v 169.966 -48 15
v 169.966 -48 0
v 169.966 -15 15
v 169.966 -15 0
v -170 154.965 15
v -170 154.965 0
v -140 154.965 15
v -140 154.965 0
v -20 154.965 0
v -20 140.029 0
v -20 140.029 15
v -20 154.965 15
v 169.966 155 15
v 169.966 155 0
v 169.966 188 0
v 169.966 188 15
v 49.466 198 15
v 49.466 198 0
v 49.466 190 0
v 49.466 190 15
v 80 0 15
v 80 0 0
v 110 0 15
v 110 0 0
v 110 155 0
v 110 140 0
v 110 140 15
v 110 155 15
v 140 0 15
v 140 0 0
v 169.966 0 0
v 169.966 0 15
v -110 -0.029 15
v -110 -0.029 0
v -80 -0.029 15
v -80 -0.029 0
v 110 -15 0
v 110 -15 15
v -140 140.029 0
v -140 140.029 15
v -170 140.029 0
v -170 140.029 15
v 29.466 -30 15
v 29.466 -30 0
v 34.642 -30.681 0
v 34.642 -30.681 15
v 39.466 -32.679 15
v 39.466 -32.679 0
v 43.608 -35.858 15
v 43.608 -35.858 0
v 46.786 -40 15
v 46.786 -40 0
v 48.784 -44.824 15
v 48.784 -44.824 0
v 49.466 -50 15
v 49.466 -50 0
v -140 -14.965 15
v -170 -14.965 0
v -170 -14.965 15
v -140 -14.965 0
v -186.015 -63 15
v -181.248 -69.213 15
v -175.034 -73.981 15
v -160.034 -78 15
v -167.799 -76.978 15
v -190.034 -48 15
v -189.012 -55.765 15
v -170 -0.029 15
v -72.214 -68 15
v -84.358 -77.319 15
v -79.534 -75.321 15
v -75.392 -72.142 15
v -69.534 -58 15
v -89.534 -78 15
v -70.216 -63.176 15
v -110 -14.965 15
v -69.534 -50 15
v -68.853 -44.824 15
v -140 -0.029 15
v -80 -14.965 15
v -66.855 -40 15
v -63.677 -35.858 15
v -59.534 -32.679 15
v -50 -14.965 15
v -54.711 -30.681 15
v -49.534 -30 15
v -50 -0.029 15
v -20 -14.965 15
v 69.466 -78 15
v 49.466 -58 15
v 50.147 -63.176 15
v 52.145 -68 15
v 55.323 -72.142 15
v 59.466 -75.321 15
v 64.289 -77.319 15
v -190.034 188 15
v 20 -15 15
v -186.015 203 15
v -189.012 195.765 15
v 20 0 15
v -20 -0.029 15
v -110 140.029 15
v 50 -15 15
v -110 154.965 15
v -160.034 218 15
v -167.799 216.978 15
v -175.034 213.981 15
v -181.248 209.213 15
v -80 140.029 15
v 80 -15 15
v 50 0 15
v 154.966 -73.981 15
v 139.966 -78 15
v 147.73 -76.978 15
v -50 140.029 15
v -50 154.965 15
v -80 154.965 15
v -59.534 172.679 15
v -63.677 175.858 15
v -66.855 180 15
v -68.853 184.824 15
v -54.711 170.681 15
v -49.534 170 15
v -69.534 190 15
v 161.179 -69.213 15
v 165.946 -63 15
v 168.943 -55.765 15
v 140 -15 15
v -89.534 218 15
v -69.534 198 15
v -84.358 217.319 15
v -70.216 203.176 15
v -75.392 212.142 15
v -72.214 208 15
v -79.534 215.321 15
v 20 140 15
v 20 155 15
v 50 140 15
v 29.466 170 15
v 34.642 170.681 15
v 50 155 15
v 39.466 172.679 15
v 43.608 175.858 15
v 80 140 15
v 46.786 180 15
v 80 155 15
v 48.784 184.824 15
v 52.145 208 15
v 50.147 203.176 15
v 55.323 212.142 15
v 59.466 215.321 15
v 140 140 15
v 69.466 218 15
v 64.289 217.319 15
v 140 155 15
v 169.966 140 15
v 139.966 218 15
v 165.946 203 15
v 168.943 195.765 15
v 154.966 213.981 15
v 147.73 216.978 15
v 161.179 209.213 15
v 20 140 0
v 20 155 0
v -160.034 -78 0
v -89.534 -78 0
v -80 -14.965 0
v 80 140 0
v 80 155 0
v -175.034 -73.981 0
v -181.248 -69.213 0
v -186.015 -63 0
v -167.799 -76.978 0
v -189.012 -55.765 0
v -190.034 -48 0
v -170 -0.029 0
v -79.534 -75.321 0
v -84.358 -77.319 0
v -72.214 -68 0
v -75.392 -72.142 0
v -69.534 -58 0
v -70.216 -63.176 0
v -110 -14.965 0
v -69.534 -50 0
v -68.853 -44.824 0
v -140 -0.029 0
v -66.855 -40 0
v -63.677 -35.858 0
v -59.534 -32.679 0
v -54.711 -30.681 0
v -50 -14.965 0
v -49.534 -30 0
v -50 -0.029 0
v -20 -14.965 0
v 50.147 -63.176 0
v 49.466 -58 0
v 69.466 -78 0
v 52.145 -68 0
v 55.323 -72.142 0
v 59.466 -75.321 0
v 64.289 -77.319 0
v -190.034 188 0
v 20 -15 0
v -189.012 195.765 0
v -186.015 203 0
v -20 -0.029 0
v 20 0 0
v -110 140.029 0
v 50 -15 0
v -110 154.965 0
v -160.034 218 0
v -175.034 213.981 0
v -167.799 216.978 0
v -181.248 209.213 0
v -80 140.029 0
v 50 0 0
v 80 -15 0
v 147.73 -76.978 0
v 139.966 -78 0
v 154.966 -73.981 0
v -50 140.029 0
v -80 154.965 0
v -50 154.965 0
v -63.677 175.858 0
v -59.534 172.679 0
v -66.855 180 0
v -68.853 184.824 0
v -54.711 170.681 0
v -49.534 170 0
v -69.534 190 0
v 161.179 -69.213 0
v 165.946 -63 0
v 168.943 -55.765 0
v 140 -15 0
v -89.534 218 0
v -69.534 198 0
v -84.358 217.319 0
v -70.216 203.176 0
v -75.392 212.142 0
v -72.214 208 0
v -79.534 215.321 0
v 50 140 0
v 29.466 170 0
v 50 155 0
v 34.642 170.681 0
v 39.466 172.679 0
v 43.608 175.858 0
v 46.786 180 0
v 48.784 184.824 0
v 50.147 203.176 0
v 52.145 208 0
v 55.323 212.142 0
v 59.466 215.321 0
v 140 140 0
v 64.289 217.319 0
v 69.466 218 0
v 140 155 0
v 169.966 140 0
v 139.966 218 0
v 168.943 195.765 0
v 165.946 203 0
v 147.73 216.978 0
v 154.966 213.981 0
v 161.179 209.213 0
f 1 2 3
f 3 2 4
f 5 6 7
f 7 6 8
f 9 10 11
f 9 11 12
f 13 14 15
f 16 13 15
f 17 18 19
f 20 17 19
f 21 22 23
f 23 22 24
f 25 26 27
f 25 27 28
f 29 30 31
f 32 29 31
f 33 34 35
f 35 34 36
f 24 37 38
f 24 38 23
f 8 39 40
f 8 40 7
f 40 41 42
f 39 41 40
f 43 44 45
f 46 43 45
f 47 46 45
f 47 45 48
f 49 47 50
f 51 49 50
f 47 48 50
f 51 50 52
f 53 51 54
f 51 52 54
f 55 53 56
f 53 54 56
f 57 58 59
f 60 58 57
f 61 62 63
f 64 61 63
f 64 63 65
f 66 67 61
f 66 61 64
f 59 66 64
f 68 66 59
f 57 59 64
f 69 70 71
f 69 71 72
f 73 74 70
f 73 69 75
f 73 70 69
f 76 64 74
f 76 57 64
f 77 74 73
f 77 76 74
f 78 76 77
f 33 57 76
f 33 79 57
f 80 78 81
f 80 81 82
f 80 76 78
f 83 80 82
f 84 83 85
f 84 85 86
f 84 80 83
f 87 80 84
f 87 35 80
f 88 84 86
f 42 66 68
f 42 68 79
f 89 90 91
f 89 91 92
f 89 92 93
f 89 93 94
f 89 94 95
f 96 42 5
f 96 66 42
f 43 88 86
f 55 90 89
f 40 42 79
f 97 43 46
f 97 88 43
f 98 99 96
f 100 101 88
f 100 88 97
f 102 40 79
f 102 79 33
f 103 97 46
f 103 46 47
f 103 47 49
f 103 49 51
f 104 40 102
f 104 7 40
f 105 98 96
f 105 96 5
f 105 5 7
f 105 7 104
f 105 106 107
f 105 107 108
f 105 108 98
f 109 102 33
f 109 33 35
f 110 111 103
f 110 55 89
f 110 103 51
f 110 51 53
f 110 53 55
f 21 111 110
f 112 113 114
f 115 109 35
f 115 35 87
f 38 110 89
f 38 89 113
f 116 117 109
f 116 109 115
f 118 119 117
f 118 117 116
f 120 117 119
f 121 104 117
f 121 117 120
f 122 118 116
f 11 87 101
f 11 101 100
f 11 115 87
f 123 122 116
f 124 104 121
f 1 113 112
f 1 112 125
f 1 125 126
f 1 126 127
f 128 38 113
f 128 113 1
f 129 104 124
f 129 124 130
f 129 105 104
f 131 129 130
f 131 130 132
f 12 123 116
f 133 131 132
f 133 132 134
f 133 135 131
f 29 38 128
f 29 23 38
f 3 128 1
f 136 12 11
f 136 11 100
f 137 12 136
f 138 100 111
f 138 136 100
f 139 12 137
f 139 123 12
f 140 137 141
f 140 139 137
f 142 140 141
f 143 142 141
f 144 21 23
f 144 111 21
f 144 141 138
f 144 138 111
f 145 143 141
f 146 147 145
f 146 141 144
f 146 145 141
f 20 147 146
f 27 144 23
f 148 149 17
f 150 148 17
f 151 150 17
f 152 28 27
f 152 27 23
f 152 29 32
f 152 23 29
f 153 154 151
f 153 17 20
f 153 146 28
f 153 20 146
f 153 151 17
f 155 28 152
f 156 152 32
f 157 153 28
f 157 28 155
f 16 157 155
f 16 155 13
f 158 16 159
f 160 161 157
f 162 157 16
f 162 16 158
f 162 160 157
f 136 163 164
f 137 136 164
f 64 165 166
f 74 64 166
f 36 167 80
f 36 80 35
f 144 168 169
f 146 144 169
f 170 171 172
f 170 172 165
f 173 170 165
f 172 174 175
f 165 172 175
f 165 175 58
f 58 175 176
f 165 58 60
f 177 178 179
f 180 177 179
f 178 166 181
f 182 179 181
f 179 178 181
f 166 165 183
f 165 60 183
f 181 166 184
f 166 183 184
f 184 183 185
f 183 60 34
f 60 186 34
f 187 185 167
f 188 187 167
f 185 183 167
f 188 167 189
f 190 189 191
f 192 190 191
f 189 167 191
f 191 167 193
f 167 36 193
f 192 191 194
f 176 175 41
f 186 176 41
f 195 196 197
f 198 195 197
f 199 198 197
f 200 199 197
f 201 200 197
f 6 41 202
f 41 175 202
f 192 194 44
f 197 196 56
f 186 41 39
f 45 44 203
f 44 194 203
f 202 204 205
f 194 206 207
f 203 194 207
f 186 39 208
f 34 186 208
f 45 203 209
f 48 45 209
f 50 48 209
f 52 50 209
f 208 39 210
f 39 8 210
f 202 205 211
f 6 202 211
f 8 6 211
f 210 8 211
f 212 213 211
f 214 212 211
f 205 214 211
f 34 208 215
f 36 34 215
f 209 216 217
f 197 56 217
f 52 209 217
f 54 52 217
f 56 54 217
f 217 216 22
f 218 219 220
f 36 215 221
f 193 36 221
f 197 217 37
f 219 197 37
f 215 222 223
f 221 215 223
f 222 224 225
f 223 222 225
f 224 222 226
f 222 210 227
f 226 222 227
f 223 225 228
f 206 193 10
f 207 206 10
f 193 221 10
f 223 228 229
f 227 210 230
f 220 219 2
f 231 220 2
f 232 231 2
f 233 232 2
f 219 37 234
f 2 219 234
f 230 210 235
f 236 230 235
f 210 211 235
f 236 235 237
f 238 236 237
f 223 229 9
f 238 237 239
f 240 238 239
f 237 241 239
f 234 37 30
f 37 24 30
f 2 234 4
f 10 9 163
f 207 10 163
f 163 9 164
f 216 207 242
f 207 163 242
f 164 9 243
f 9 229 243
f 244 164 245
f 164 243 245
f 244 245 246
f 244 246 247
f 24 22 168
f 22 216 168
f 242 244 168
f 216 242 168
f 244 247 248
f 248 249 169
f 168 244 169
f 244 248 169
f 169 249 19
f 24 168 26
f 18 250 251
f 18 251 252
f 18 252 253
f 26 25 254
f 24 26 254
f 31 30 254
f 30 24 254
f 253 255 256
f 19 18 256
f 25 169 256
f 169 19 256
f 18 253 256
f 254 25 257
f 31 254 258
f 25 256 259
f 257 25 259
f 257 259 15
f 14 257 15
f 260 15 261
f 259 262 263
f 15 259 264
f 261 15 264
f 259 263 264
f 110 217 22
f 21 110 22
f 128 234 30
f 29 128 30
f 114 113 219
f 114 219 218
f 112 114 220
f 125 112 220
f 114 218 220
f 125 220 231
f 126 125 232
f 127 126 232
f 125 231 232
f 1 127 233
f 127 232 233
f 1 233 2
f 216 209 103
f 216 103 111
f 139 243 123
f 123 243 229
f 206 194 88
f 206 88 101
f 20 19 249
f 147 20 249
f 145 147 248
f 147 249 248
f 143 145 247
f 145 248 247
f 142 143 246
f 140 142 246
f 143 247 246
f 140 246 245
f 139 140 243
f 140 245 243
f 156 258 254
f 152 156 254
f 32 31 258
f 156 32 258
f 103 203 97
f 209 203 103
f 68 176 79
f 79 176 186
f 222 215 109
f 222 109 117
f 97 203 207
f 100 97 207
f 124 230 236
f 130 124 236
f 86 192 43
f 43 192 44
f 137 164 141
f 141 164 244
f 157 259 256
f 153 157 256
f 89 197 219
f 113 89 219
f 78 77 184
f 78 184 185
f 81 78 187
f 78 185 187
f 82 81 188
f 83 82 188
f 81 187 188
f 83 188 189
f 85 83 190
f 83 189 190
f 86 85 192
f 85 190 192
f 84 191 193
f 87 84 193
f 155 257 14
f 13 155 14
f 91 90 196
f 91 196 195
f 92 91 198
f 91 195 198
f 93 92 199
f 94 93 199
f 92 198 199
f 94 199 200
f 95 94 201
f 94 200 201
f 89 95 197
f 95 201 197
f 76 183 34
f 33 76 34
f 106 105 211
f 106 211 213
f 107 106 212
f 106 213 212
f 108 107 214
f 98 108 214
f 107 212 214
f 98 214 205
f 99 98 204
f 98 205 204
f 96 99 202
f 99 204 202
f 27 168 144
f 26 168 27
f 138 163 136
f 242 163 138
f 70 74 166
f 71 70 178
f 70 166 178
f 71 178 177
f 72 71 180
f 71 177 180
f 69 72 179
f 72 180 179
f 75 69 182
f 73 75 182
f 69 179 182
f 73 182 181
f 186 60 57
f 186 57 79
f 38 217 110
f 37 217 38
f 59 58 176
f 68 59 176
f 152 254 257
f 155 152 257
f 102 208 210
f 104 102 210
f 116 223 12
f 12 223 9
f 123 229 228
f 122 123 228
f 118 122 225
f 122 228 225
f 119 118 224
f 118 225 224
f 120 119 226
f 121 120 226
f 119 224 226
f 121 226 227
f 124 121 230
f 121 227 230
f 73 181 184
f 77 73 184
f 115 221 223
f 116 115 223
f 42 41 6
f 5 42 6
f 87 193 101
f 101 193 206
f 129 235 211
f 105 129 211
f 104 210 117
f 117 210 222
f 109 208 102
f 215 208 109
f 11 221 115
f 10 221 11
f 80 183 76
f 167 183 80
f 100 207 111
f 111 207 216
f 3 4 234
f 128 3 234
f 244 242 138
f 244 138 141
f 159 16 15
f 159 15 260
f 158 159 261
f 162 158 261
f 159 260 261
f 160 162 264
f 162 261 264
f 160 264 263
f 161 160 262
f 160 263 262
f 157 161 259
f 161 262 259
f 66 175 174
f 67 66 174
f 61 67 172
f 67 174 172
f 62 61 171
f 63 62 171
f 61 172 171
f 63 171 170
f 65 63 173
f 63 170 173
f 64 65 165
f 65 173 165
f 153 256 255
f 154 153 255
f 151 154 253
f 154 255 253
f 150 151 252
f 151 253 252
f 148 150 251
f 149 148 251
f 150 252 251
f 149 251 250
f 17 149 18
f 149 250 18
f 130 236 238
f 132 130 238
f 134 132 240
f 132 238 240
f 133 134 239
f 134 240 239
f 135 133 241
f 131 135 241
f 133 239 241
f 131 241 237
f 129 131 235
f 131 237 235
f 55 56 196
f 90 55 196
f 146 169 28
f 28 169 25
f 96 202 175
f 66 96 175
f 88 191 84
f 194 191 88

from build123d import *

# Parameters (mm, degrees)
SKETCH1_W           = 30
SKETCH1_H           = 14.936006603
SKETCH1_H_2         = 15
BOSS_EXTRUDE1_DEPTH = 15


with BuildPart() as part:
    # Sketch1 → Boss-Extrude1 (new body)
    with BuildSketch(Plane.XY):
        with BuildLine():
            Line((169.965634662, 155), (169.965634662, 188))
            ThreePointArc((169.965634662, 188), (161.178838098, 209.213203436), (139.965634662, 218))
            Line((139.965634662, 218), (69.465634662, 218))
            ThreePointArc((69.465634662, 218), (55.323499038, 212.142135624), (49.465634662, 198))
            Line((49.465634662, 198), (49.465634662, 190))
            ThreePointArc((49.465634662, 190), (43.607770286, 175.857864376), (29.465634662, 170))
            Line((29.465634662, 170), (-49.534365338, 170))
            ThreePointArc((-49.534365338, 170), (-63.676500962, 175.857864376), (-69.534365338, 190))
            Line((-69.534365338, 190), (-69.534365338, 198))
            ThreePointArc((-69.534365338, 198), (-75.392229714, 212.142135624), (-89.534365338, 218))
            Line((-89.534365338, 218), (-160.034365338, 218))
            ThreePointArc((-160.034365338, 218), (-181.247568774, 209.213203436), (-190.034365338, 188))
            Line((-190.034365338, 188), (-190.034365338, -48))
            ThreePointArc((-190.034365338, -48), (-181.247568774, -69.213203436), (-160.034365338, -78))
            Line((-160.034365338, -78), (-89.534365338, -78))
            ThreePointArc((-89.534365338, -78), (-75.392229714, -72.142135624), (-69.534365338, -58))
            Line((-69.534365338, -58), (-69.534365338, -50))
            ThreePointArc((-69.534365338, -50), (-63.676500962, -35.857864376), (-49.534365338, -30))
            Line((-49.534365338, -30), (29.465634662, -30))
            ThreePointArc((29.465634662, -30), (43.607770286, -35.857864376), (49.465634662, -50))
            Line((49.465634662, -50), (49.465634662, -58))
            ThreePointArc((49.465634662, -58), (55.323499038, -72.142135624), (69.465634662, -78))
            Line((69.465634662, -78), (139.965634662, -78))
            ThreePointArc((139.965634662, -78), (161.178838098, -69.213203436), (169.965634662, -48))
            Line((169.965634662, -48), (169.965634662, -15))
            Line((169.965634662, -15), (140, -15))
            Line((140, -15), (140, 0))
            Line((140, 0), (169.965634662, 0))
            Line((169.965634662, 0), (169.965634662, 140))
            Line((169.965634662, 140), (140, 140))
            Line((140, 140), (140, 155))
            Line((140, 155), (169.965634662, 155))
        make_face()
        with Locations((-155, -7.497163522)):
            Rectangle(SKETCH1_W, SKETCH1_H, mode=Mode.SUBTRACT)
        with Locations((-95, -7.497163522)):
            Rectangle(SKETCH1_W, SKETCH1_H, mode=Mode.SUBTRACT)
        with Locations((-35, -7.497163522)):
            Rectangle(SKETCH1_W, SKETCH1_H, mode=Mode.SUBTRACT)
        with Locations((35, -7.5)):
            Rectangle(SKETCH1_W, SKETCH1_H_2, mode=Mode.SUBTRACT)
        with Locations((95, -7.5)):
            Rectangle(SKETCH1_W, SKETCH1_H_2, mode=Mode.SUBTRACT)
        with Locations((-155, 147.497163521)):
            Rectangle(SKETCH1_W, SKETCH1_H, mode=Mode.SUBTRACT)
        with Locations((-95, 147.497163521)):
            Rectangle(SKETCH1_W, SKETCH1_H, mode=Mode.SUBTRACT)
        with Locations((-35, 147.497163521)):
            Rectangle(SKETCH1_W, SKETCH1_H, mode=Mode.SUBTRACT)
        with Locations((35, 147.5)):
            Rectangle(SKETCH1_W, SKETCH1_H_2, mode=Mode.SUBTRACT)
        with Locations((95, 147.5)):
            Rectangle(SKETCH1_W, SKETCH1_H_2, mode=Mode.SUBTRACT)
    extrude(amount=BOSS_EXTRUDE1_DEPTH)


solid = part.part
